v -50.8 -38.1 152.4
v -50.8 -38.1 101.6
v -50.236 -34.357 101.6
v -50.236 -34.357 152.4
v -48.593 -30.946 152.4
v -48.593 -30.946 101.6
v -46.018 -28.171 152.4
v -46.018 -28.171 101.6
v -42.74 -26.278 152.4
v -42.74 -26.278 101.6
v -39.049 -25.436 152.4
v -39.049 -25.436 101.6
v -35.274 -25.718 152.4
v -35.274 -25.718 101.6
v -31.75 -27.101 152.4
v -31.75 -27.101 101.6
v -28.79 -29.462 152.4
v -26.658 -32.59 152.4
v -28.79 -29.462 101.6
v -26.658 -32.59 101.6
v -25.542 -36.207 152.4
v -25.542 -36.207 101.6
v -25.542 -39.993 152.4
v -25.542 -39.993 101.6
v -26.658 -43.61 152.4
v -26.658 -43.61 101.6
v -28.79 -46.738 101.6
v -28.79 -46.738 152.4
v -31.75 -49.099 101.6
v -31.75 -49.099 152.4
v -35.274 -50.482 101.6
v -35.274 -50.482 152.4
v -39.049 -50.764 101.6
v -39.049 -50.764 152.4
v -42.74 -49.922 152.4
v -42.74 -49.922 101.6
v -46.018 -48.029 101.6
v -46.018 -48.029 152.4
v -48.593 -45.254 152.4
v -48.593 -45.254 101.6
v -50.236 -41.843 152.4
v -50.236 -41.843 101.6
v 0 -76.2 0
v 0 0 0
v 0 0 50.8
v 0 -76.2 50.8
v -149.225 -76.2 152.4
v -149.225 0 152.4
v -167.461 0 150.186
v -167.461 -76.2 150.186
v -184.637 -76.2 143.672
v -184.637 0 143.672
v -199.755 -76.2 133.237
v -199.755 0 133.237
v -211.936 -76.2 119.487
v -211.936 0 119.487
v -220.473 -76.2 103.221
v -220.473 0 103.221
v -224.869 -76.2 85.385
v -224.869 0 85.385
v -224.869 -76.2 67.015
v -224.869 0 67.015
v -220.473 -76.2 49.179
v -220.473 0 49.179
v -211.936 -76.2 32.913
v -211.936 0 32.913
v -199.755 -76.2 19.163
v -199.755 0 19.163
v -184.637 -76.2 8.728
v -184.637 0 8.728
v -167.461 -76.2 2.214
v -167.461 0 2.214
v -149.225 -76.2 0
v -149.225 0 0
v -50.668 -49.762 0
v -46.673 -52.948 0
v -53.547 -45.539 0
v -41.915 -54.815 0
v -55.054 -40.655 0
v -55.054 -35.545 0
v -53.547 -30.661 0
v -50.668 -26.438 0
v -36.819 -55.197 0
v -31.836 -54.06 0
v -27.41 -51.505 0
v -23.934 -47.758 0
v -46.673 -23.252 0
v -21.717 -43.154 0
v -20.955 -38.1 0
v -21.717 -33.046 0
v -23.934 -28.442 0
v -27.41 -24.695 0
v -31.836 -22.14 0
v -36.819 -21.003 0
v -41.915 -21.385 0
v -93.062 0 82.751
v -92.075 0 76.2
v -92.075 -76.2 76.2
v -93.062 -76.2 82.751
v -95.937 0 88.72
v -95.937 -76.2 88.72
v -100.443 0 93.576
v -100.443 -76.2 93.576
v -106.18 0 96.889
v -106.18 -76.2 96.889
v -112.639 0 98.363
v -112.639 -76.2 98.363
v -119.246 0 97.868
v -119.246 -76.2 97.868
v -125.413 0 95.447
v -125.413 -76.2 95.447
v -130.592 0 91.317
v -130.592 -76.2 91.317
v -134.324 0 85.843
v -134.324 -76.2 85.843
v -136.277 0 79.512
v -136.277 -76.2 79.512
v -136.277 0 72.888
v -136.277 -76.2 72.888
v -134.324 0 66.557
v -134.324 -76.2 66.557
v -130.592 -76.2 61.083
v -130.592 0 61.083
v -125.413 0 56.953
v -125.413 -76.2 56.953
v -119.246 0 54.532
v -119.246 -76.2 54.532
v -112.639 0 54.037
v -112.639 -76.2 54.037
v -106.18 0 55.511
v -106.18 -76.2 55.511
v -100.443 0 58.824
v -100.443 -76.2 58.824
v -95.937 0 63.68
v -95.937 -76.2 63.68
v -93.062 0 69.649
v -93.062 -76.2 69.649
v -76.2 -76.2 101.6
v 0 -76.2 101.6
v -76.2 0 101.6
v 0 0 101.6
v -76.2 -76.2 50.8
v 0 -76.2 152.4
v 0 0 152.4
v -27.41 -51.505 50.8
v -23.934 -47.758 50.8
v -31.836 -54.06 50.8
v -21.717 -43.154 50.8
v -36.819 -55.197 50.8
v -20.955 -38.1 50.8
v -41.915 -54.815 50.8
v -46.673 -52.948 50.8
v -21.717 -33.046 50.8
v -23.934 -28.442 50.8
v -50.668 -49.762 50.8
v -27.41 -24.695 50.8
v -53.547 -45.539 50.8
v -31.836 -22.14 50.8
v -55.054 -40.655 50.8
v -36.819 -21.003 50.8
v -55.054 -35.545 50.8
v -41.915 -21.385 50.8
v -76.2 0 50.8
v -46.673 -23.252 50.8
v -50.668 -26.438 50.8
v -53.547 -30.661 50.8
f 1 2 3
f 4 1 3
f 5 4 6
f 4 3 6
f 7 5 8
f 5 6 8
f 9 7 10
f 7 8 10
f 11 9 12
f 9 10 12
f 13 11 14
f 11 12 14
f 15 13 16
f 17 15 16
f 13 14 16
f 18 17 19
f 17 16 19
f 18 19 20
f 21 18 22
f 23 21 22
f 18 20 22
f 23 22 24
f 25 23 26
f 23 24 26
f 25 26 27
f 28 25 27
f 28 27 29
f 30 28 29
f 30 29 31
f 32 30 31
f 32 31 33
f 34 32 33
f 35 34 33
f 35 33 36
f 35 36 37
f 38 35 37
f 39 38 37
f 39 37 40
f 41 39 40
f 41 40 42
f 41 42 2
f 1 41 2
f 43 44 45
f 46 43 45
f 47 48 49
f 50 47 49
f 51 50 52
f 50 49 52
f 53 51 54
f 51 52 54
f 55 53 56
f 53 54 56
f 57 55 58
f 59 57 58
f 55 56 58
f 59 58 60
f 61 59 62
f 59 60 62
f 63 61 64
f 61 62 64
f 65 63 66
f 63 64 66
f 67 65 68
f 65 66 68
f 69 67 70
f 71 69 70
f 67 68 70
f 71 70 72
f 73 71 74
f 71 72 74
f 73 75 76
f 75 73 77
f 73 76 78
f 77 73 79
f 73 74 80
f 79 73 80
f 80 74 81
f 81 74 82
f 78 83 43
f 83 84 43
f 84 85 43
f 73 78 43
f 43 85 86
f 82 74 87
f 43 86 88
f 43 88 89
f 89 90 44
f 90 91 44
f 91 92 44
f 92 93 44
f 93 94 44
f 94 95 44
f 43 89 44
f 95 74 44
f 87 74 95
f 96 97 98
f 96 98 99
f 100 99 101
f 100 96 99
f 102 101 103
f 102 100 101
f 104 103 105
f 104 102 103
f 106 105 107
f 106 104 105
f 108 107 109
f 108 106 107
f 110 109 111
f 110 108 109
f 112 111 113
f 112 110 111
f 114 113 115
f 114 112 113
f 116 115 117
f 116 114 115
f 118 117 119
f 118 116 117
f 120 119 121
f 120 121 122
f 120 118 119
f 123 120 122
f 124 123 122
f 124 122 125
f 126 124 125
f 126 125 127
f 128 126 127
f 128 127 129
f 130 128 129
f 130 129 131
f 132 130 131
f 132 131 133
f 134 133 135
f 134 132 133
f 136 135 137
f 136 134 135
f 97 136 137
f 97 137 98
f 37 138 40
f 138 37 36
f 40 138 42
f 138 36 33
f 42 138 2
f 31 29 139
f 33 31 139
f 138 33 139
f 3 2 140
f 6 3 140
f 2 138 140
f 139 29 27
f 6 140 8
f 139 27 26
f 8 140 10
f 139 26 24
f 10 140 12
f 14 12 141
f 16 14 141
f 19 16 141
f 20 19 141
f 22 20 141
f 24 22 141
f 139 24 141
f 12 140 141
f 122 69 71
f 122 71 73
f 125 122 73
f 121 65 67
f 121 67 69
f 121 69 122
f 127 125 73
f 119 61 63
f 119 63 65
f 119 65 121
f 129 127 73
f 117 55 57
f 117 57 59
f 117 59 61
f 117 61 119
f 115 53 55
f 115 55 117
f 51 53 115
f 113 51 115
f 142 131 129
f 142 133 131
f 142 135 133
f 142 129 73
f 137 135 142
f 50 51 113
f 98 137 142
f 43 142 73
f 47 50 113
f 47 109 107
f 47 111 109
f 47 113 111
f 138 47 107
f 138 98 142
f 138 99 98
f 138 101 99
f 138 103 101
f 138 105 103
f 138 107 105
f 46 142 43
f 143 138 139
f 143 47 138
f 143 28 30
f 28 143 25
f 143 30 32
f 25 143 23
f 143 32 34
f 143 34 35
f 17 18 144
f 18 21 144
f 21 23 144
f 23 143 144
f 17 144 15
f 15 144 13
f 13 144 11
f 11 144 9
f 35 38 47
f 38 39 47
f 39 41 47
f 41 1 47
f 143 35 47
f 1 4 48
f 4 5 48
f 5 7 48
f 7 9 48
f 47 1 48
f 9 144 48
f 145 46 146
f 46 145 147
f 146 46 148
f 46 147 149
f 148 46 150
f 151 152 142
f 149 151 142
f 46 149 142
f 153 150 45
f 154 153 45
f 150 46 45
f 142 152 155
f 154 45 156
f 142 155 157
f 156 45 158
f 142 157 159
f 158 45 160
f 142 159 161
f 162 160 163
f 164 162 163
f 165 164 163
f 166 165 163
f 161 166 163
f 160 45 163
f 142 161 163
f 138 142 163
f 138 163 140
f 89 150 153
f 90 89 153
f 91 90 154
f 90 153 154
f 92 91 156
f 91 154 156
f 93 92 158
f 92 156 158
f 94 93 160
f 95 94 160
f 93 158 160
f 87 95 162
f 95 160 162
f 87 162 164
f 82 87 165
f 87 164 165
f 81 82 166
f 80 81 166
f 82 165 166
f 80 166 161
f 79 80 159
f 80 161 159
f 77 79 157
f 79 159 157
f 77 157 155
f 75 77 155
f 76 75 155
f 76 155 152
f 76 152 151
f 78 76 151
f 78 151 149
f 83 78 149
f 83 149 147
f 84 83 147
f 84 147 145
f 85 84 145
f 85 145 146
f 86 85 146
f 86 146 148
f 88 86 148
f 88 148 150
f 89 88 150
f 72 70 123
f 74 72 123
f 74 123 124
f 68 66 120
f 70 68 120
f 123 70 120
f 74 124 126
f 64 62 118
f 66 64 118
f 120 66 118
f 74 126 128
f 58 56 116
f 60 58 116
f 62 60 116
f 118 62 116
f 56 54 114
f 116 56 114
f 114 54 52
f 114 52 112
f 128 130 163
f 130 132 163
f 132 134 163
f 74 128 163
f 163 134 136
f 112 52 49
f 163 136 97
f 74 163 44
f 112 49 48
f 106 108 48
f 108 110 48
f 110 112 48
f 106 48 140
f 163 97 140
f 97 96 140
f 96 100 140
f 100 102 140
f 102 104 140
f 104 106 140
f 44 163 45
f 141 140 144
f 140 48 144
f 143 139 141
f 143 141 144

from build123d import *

# Parameters (mm, degrees)
F0_R     = 22.225
F1_DEPTH = 76.2
F4_D     = 34.29
F4_DEPTH = 50.801
F6_D     = 25.4


with BuildPart() as f1:
    # F0 (on Front) → F1 (new body)
    with BuildSketch(Plane.XZ):
        with BuildLine():
            Line((-149.225, 0), (0, 0))
            Line((0, 0), (0, 50.8))
            Line((0, 50.8), (-76.2, 50.8))
            Line((-76.2, 50.8), (-76.2, 101.6))
            Line((-76.2, 101.6), (0, 101.6))
            Line((0, 101.6), (0, 152.4))
            Line((0, 152.4), (-149.225, 152.4))
            ThreePointArc((-149.225, 152.4), (-225.425, 76.2), (-149.225, 0))
        make_face()
        with Locations((-114.3, 76.2)):
            Circle(F0_R, mode=Mode.SUBTRACT)
    extrude(amount=F1_DEPTH)

    # F4 (through all, one way)
    with BuildSketch(Plane.XY.offset(50.8)):
        with Locations((-38.1, -38.1)):
            Circle(F4_D / 2)
    extrude(amount=-F4_DEPTH, mode=Mode.SUBTRACT)

    # F6 (through all)
    with Locations(Plane.XY.offset(152.4)):
        with Locations((-38.1, -38.1)):
            Hole(F6_D / 2)


solid = f1.part
